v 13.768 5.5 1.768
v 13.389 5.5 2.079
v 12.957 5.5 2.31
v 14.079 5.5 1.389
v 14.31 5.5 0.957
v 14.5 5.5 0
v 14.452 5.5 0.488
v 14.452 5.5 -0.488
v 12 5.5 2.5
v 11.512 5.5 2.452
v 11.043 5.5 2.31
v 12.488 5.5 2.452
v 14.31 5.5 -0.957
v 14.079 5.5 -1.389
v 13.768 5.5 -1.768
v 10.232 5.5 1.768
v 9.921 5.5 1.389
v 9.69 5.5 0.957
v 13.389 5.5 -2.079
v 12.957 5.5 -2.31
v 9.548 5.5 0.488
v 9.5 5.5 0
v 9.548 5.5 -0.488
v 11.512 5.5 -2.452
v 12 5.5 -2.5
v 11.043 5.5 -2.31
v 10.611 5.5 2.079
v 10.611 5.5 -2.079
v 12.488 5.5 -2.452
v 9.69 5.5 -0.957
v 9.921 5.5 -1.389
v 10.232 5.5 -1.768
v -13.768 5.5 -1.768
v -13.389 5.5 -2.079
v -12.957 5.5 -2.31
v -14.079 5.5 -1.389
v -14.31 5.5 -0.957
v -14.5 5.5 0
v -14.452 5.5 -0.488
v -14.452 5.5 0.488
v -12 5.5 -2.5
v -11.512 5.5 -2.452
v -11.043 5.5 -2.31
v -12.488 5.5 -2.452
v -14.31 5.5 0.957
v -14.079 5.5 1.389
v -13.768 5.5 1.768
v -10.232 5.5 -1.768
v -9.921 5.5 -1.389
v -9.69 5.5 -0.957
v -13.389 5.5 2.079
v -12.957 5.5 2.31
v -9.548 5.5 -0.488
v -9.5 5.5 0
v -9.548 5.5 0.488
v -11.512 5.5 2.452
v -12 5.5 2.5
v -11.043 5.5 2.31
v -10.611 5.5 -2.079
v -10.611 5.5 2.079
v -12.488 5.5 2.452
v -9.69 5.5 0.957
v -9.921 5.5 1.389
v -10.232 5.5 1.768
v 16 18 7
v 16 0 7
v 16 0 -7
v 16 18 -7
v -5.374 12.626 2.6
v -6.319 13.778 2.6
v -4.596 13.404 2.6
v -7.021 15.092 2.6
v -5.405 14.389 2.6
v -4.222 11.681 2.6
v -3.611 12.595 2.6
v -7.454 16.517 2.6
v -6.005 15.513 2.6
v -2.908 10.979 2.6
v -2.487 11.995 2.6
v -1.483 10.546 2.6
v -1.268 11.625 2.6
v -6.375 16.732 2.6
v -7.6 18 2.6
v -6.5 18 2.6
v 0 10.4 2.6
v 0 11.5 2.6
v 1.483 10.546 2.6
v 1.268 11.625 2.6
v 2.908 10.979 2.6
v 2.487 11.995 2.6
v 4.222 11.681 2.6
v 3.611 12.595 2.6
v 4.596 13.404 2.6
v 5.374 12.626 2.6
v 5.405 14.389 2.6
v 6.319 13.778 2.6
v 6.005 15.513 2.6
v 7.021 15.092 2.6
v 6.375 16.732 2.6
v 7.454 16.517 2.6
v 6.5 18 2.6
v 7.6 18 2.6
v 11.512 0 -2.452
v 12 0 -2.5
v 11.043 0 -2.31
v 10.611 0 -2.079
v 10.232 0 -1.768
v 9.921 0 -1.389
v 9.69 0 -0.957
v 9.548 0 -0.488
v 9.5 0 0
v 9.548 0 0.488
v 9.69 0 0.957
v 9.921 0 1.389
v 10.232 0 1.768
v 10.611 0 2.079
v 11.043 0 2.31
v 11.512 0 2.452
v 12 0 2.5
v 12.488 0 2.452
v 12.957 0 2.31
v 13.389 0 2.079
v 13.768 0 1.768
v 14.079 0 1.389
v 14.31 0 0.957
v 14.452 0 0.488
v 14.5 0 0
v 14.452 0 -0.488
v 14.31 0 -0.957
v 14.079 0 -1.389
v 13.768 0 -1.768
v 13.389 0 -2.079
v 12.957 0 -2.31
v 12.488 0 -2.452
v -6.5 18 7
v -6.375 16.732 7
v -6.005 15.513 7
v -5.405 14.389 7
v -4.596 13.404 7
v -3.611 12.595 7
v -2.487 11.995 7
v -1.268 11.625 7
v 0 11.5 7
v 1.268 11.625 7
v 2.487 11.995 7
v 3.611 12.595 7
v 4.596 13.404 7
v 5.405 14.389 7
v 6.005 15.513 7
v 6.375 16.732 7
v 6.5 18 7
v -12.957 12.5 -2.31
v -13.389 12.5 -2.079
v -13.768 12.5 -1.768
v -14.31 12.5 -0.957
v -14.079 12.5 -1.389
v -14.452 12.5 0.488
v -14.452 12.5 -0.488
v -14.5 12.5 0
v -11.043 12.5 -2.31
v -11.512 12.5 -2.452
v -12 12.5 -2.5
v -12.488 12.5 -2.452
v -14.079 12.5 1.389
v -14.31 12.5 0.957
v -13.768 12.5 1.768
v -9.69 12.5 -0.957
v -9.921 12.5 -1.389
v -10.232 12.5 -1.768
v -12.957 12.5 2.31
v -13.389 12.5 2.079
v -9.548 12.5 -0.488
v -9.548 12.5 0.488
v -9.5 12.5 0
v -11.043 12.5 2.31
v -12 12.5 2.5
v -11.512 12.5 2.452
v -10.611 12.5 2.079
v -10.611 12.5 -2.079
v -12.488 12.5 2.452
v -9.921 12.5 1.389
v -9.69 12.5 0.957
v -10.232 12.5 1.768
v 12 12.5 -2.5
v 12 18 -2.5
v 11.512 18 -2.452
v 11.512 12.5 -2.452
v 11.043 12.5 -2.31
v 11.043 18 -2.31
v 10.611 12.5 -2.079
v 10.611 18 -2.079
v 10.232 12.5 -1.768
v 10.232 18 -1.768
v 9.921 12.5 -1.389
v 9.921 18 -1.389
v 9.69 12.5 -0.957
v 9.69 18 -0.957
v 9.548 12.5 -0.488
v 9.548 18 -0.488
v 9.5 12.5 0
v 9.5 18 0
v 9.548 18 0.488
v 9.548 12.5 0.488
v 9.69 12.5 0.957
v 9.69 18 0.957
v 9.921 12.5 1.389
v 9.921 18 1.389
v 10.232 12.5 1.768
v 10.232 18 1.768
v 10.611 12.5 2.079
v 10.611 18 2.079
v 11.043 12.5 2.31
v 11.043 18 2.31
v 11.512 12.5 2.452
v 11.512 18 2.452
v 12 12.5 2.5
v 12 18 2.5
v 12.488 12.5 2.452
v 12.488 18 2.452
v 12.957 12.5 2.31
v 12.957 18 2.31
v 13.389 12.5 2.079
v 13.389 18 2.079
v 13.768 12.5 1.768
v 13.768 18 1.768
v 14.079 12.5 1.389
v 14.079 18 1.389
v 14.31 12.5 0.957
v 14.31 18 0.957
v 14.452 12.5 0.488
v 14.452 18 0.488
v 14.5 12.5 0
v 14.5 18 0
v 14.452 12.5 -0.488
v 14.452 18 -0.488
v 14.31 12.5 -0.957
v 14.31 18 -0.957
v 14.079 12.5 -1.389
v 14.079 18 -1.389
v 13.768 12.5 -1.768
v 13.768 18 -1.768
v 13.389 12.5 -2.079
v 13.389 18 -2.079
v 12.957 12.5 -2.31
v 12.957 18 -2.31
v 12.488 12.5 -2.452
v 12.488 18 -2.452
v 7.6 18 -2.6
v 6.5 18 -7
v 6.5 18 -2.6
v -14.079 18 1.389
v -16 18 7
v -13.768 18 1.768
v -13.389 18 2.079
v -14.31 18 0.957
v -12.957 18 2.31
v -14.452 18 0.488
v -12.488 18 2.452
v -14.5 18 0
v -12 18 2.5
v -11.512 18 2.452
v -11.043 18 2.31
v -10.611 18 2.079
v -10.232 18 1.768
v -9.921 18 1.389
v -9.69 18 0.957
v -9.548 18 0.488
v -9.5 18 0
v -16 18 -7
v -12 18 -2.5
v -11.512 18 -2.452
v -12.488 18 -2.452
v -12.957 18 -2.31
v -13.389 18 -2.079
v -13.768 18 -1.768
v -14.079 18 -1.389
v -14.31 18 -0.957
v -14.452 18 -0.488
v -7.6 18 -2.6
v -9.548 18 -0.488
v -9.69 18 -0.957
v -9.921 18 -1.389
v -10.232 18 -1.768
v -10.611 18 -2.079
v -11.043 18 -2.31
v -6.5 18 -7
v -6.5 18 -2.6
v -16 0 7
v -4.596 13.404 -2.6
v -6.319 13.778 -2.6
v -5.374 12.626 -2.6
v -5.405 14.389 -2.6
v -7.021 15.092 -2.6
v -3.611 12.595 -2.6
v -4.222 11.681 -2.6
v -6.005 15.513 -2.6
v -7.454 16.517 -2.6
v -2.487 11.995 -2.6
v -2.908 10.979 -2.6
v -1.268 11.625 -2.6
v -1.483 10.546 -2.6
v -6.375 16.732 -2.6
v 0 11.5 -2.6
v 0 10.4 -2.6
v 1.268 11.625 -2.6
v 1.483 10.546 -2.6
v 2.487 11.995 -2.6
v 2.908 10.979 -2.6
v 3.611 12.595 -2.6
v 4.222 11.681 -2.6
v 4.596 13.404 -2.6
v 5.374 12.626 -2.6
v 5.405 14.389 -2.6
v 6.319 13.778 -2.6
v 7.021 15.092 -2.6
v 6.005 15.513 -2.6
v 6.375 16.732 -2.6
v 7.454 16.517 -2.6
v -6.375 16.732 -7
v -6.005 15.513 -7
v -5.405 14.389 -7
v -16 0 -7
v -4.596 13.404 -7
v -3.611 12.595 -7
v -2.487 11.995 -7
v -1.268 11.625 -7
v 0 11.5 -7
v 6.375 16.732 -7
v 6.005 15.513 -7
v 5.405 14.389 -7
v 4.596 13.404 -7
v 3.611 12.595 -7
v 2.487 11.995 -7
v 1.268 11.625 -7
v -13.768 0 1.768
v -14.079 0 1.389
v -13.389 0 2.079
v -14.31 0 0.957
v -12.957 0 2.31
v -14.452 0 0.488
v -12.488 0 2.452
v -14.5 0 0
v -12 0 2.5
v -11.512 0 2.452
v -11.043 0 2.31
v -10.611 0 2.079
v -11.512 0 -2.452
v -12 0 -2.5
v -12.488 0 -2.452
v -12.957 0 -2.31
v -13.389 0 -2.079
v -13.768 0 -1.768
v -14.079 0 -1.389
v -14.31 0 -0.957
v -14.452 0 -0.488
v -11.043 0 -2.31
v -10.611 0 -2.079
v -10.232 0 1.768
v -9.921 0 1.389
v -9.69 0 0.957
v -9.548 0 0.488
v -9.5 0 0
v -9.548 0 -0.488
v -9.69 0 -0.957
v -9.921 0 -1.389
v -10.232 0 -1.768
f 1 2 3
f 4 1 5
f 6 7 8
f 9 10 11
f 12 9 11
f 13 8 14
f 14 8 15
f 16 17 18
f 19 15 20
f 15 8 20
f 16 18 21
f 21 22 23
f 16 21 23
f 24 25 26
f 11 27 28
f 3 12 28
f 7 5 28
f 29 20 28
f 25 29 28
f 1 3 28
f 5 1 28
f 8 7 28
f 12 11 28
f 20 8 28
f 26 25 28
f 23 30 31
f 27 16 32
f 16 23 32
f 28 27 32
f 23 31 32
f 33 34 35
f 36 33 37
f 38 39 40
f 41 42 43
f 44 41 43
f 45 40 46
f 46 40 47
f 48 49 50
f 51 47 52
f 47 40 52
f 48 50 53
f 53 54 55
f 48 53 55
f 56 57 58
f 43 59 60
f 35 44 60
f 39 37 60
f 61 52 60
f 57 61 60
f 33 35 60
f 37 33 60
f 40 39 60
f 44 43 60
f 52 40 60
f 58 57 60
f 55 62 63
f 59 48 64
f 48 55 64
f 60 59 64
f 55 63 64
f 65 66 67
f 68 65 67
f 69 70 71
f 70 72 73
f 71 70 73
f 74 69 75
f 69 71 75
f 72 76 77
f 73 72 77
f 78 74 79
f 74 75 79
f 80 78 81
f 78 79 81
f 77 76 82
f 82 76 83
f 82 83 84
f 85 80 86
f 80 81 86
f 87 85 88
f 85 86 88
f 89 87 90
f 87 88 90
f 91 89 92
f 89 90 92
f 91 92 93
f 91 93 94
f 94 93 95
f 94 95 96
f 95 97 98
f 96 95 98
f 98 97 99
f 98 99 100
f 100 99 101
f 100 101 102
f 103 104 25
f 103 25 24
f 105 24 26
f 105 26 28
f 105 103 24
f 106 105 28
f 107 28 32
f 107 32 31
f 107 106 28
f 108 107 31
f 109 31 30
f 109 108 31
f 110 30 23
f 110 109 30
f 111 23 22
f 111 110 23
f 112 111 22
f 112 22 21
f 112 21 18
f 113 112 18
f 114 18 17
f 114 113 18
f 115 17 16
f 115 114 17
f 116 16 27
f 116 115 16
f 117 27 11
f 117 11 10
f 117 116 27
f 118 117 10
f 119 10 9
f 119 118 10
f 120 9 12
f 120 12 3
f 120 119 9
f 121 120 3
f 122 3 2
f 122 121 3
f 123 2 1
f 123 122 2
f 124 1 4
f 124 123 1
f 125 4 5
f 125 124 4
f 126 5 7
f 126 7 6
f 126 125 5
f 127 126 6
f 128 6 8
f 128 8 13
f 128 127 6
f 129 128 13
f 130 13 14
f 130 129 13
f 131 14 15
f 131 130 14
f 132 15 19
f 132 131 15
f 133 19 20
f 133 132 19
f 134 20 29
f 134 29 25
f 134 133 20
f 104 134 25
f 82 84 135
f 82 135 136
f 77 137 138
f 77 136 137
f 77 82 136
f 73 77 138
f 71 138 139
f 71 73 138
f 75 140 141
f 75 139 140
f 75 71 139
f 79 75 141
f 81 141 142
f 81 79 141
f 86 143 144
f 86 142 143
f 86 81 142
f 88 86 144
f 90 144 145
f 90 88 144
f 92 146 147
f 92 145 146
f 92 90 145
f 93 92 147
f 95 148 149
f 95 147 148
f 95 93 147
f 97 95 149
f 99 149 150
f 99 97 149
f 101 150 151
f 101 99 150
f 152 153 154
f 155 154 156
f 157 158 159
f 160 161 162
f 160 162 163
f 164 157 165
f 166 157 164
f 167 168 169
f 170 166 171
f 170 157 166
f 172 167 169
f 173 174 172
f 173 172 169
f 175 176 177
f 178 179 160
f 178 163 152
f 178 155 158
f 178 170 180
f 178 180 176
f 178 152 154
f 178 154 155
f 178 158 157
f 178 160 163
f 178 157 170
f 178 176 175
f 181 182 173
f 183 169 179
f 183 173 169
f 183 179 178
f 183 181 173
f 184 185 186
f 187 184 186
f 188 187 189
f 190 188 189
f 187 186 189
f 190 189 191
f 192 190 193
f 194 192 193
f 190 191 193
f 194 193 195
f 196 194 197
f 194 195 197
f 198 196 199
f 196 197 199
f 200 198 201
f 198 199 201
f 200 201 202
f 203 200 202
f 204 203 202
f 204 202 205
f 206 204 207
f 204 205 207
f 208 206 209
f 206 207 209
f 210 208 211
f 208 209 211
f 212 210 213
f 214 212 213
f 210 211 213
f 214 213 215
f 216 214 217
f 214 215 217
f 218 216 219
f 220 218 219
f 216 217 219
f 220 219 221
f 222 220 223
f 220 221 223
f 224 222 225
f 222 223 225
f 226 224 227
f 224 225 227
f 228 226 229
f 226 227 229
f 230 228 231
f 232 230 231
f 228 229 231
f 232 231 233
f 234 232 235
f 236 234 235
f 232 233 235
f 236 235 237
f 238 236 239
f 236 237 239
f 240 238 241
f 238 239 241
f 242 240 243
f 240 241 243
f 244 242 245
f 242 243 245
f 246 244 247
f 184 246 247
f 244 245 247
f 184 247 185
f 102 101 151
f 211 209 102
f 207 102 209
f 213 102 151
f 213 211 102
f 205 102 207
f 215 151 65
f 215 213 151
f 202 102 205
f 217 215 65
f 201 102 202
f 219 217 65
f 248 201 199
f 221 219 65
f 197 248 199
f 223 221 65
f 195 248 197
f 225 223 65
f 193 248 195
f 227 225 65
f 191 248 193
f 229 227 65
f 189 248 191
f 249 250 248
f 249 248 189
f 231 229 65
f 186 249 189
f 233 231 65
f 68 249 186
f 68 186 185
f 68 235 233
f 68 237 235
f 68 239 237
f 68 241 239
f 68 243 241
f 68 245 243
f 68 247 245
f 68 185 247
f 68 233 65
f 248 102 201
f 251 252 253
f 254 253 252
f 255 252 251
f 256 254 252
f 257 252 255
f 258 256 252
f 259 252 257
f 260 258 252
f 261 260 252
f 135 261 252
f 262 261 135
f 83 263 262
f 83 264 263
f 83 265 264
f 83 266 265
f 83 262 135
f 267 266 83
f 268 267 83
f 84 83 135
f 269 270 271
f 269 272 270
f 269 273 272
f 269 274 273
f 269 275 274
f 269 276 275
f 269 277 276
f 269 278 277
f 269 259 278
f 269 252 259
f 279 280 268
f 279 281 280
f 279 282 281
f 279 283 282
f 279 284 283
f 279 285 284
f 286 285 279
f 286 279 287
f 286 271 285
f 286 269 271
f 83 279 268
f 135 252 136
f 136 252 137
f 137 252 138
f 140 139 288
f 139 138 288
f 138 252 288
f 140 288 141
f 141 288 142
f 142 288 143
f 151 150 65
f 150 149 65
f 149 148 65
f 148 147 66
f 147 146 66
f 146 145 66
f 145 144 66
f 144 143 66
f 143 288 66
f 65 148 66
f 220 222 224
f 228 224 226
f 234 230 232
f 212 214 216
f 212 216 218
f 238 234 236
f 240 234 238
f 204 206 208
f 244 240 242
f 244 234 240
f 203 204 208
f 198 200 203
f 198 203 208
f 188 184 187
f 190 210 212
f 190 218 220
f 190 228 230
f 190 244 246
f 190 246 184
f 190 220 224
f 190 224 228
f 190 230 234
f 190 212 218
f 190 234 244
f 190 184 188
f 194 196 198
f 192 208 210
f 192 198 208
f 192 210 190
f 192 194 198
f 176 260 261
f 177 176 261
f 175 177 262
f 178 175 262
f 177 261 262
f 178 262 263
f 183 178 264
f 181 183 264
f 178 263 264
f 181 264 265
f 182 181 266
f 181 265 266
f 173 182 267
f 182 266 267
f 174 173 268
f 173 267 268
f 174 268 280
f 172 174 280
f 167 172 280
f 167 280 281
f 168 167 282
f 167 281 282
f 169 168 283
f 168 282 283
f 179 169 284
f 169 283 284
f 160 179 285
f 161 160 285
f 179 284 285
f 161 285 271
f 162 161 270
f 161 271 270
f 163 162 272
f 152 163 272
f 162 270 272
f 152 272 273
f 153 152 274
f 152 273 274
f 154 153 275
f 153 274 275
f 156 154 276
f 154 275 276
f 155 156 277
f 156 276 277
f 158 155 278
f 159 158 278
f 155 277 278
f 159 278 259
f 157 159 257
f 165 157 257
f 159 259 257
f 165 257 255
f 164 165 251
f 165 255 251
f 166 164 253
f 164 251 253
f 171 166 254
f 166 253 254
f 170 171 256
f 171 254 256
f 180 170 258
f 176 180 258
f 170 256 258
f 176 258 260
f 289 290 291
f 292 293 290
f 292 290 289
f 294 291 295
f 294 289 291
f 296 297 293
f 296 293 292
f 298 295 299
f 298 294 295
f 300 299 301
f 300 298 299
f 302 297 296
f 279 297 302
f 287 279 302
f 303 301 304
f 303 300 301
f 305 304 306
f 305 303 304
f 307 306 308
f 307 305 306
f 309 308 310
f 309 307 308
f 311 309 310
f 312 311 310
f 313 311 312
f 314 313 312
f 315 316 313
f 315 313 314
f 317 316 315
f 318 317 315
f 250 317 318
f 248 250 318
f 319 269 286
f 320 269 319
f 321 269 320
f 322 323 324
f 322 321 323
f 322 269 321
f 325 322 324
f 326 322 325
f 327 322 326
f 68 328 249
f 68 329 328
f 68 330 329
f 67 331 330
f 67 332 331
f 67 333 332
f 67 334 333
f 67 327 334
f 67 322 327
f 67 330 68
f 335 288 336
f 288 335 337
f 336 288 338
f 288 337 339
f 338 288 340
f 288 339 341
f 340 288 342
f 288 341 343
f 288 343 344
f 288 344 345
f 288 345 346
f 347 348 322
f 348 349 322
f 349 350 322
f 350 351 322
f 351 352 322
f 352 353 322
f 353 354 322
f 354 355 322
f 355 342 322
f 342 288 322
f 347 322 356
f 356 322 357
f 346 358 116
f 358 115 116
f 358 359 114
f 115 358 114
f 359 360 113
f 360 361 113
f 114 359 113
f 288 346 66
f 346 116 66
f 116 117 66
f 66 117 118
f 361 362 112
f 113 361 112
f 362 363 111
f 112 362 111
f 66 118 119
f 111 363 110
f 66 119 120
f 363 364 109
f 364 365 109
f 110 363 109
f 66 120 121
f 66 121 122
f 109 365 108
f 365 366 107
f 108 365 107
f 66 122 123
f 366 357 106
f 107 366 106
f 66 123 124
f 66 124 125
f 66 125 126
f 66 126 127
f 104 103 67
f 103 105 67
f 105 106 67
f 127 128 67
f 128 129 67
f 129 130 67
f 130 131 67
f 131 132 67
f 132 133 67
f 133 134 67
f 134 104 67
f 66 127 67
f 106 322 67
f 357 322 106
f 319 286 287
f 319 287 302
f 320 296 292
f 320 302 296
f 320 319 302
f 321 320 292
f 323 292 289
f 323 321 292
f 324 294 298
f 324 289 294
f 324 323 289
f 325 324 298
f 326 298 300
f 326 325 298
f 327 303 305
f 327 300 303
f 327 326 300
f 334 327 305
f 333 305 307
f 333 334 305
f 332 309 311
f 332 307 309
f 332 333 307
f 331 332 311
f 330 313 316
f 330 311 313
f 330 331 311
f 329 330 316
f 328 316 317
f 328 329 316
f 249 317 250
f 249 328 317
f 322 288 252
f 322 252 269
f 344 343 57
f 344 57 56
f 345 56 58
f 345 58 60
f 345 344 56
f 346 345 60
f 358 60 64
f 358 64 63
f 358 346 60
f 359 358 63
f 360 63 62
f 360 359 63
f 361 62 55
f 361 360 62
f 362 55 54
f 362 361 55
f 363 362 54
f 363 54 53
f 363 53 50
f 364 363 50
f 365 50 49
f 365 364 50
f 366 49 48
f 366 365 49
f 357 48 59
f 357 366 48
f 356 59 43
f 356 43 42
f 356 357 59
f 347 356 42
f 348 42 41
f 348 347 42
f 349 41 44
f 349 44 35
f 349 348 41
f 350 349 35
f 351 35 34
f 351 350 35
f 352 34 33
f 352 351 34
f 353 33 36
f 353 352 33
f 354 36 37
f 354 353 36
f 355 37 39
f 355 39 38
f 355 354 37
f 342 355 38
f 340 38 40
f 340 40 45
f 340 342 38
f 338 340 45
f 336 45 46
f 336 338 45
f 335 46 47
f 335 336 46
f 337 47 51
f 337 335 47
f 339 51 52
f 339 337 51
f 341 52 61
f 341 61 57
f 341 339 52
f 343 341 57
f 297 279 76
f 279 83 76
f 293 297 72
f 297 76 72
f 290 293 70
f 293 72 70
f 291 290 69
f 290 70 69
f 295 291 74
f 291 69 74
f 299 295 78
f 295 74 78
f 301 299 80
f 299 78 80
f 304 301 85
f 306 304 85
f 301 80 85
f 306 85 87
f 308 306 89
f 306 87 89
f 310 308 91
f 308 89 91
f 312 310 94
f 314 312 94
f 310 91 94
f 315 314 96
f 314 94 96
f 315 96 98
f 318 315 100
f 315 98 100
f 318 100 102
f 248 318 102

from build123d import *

# Parameters (mm, degrees)
SKETCH_1_W               = 32
SKETCH_1_H               = 14
EXTRUDE_1_DEPTH          = 18
SKETCH_3_R               = 7.6
CUT_EXTRUDE_1_DEPTH      = 2.6
CUT_EXTRUDE_2_DEPTH      = 26.079872408
CUT_EXTRUDE_2_DEPTH_BACK = 26.079872408
SKETCH_4_R               = 6.5
SKETCH_5_R               = 2.5
CUT_EXTRUDE_3_DEPTH      = 5.5


with BuildPart() as part:
    # 草圖1 → 填料-伸長1 (new body)
    with BuildSketch(Plane(origin=(0, 0, 0), x_dir=(1, 0, 0), z_dir=(0, 1, 0))):
        Rectangle(SKETCH_1_W, SKETCH_1_H)
    extrude(amount=EXTRUDE_1_DEPTH)

    # 草圖3 → 除料-伸長1 (cut, symmetric)
    with BuildSketch(Plane.XY):
        with Locations((0, 18)):
            Circle(SKETCH_3_R)
    extrude(amount=CUT_EXTRUDE_1_DEPTH, both=True, mode=Mode.SUBTRACT)

    # 草圖4 → 除料-伸長2 (cut, two sides: drawn at the far end of the back side and taken through both)
    with BuildSketch(Plane.XY.offset(-CUT_EXTRUDE_2_DEPTH_BACK)):
        with Locations((0, 18)):
            Circle(SKETCH_4_R)
    extrude(amount=CUT_EXTRUDE_2_DEPTH + CUT_EXTRUDE_2_DEPTH_BACK, mode=Mode.SUBTRACT)

    # 草圖5 → 除料-伸長3 (cut)
    with BuildSketch(Plane(origin=(0, 18, 0), x_dir=(1, 0, 0), z_dir=(0, 1, 0))):
        with Locations(Location((-12, 0, 0), (0, 0, 270))):
            Circle(SKETCH_5_R)
        with Locations(Location((12, 0, 0), (0, 0, 90))):
            Circle(SKETCH_5_R)
    cut_extrude_3 = extrude(amount=-CUT_EXTRUDE_3_DEPTH, mode=Mode.SUBTRACT)

    # Mirror1: 除料-伸長3 across plane
    add(cut_extrude_3.mirror(Plane.ZX.offset(9)), mode=Mode.SUBTRACT)


solid = part.part
